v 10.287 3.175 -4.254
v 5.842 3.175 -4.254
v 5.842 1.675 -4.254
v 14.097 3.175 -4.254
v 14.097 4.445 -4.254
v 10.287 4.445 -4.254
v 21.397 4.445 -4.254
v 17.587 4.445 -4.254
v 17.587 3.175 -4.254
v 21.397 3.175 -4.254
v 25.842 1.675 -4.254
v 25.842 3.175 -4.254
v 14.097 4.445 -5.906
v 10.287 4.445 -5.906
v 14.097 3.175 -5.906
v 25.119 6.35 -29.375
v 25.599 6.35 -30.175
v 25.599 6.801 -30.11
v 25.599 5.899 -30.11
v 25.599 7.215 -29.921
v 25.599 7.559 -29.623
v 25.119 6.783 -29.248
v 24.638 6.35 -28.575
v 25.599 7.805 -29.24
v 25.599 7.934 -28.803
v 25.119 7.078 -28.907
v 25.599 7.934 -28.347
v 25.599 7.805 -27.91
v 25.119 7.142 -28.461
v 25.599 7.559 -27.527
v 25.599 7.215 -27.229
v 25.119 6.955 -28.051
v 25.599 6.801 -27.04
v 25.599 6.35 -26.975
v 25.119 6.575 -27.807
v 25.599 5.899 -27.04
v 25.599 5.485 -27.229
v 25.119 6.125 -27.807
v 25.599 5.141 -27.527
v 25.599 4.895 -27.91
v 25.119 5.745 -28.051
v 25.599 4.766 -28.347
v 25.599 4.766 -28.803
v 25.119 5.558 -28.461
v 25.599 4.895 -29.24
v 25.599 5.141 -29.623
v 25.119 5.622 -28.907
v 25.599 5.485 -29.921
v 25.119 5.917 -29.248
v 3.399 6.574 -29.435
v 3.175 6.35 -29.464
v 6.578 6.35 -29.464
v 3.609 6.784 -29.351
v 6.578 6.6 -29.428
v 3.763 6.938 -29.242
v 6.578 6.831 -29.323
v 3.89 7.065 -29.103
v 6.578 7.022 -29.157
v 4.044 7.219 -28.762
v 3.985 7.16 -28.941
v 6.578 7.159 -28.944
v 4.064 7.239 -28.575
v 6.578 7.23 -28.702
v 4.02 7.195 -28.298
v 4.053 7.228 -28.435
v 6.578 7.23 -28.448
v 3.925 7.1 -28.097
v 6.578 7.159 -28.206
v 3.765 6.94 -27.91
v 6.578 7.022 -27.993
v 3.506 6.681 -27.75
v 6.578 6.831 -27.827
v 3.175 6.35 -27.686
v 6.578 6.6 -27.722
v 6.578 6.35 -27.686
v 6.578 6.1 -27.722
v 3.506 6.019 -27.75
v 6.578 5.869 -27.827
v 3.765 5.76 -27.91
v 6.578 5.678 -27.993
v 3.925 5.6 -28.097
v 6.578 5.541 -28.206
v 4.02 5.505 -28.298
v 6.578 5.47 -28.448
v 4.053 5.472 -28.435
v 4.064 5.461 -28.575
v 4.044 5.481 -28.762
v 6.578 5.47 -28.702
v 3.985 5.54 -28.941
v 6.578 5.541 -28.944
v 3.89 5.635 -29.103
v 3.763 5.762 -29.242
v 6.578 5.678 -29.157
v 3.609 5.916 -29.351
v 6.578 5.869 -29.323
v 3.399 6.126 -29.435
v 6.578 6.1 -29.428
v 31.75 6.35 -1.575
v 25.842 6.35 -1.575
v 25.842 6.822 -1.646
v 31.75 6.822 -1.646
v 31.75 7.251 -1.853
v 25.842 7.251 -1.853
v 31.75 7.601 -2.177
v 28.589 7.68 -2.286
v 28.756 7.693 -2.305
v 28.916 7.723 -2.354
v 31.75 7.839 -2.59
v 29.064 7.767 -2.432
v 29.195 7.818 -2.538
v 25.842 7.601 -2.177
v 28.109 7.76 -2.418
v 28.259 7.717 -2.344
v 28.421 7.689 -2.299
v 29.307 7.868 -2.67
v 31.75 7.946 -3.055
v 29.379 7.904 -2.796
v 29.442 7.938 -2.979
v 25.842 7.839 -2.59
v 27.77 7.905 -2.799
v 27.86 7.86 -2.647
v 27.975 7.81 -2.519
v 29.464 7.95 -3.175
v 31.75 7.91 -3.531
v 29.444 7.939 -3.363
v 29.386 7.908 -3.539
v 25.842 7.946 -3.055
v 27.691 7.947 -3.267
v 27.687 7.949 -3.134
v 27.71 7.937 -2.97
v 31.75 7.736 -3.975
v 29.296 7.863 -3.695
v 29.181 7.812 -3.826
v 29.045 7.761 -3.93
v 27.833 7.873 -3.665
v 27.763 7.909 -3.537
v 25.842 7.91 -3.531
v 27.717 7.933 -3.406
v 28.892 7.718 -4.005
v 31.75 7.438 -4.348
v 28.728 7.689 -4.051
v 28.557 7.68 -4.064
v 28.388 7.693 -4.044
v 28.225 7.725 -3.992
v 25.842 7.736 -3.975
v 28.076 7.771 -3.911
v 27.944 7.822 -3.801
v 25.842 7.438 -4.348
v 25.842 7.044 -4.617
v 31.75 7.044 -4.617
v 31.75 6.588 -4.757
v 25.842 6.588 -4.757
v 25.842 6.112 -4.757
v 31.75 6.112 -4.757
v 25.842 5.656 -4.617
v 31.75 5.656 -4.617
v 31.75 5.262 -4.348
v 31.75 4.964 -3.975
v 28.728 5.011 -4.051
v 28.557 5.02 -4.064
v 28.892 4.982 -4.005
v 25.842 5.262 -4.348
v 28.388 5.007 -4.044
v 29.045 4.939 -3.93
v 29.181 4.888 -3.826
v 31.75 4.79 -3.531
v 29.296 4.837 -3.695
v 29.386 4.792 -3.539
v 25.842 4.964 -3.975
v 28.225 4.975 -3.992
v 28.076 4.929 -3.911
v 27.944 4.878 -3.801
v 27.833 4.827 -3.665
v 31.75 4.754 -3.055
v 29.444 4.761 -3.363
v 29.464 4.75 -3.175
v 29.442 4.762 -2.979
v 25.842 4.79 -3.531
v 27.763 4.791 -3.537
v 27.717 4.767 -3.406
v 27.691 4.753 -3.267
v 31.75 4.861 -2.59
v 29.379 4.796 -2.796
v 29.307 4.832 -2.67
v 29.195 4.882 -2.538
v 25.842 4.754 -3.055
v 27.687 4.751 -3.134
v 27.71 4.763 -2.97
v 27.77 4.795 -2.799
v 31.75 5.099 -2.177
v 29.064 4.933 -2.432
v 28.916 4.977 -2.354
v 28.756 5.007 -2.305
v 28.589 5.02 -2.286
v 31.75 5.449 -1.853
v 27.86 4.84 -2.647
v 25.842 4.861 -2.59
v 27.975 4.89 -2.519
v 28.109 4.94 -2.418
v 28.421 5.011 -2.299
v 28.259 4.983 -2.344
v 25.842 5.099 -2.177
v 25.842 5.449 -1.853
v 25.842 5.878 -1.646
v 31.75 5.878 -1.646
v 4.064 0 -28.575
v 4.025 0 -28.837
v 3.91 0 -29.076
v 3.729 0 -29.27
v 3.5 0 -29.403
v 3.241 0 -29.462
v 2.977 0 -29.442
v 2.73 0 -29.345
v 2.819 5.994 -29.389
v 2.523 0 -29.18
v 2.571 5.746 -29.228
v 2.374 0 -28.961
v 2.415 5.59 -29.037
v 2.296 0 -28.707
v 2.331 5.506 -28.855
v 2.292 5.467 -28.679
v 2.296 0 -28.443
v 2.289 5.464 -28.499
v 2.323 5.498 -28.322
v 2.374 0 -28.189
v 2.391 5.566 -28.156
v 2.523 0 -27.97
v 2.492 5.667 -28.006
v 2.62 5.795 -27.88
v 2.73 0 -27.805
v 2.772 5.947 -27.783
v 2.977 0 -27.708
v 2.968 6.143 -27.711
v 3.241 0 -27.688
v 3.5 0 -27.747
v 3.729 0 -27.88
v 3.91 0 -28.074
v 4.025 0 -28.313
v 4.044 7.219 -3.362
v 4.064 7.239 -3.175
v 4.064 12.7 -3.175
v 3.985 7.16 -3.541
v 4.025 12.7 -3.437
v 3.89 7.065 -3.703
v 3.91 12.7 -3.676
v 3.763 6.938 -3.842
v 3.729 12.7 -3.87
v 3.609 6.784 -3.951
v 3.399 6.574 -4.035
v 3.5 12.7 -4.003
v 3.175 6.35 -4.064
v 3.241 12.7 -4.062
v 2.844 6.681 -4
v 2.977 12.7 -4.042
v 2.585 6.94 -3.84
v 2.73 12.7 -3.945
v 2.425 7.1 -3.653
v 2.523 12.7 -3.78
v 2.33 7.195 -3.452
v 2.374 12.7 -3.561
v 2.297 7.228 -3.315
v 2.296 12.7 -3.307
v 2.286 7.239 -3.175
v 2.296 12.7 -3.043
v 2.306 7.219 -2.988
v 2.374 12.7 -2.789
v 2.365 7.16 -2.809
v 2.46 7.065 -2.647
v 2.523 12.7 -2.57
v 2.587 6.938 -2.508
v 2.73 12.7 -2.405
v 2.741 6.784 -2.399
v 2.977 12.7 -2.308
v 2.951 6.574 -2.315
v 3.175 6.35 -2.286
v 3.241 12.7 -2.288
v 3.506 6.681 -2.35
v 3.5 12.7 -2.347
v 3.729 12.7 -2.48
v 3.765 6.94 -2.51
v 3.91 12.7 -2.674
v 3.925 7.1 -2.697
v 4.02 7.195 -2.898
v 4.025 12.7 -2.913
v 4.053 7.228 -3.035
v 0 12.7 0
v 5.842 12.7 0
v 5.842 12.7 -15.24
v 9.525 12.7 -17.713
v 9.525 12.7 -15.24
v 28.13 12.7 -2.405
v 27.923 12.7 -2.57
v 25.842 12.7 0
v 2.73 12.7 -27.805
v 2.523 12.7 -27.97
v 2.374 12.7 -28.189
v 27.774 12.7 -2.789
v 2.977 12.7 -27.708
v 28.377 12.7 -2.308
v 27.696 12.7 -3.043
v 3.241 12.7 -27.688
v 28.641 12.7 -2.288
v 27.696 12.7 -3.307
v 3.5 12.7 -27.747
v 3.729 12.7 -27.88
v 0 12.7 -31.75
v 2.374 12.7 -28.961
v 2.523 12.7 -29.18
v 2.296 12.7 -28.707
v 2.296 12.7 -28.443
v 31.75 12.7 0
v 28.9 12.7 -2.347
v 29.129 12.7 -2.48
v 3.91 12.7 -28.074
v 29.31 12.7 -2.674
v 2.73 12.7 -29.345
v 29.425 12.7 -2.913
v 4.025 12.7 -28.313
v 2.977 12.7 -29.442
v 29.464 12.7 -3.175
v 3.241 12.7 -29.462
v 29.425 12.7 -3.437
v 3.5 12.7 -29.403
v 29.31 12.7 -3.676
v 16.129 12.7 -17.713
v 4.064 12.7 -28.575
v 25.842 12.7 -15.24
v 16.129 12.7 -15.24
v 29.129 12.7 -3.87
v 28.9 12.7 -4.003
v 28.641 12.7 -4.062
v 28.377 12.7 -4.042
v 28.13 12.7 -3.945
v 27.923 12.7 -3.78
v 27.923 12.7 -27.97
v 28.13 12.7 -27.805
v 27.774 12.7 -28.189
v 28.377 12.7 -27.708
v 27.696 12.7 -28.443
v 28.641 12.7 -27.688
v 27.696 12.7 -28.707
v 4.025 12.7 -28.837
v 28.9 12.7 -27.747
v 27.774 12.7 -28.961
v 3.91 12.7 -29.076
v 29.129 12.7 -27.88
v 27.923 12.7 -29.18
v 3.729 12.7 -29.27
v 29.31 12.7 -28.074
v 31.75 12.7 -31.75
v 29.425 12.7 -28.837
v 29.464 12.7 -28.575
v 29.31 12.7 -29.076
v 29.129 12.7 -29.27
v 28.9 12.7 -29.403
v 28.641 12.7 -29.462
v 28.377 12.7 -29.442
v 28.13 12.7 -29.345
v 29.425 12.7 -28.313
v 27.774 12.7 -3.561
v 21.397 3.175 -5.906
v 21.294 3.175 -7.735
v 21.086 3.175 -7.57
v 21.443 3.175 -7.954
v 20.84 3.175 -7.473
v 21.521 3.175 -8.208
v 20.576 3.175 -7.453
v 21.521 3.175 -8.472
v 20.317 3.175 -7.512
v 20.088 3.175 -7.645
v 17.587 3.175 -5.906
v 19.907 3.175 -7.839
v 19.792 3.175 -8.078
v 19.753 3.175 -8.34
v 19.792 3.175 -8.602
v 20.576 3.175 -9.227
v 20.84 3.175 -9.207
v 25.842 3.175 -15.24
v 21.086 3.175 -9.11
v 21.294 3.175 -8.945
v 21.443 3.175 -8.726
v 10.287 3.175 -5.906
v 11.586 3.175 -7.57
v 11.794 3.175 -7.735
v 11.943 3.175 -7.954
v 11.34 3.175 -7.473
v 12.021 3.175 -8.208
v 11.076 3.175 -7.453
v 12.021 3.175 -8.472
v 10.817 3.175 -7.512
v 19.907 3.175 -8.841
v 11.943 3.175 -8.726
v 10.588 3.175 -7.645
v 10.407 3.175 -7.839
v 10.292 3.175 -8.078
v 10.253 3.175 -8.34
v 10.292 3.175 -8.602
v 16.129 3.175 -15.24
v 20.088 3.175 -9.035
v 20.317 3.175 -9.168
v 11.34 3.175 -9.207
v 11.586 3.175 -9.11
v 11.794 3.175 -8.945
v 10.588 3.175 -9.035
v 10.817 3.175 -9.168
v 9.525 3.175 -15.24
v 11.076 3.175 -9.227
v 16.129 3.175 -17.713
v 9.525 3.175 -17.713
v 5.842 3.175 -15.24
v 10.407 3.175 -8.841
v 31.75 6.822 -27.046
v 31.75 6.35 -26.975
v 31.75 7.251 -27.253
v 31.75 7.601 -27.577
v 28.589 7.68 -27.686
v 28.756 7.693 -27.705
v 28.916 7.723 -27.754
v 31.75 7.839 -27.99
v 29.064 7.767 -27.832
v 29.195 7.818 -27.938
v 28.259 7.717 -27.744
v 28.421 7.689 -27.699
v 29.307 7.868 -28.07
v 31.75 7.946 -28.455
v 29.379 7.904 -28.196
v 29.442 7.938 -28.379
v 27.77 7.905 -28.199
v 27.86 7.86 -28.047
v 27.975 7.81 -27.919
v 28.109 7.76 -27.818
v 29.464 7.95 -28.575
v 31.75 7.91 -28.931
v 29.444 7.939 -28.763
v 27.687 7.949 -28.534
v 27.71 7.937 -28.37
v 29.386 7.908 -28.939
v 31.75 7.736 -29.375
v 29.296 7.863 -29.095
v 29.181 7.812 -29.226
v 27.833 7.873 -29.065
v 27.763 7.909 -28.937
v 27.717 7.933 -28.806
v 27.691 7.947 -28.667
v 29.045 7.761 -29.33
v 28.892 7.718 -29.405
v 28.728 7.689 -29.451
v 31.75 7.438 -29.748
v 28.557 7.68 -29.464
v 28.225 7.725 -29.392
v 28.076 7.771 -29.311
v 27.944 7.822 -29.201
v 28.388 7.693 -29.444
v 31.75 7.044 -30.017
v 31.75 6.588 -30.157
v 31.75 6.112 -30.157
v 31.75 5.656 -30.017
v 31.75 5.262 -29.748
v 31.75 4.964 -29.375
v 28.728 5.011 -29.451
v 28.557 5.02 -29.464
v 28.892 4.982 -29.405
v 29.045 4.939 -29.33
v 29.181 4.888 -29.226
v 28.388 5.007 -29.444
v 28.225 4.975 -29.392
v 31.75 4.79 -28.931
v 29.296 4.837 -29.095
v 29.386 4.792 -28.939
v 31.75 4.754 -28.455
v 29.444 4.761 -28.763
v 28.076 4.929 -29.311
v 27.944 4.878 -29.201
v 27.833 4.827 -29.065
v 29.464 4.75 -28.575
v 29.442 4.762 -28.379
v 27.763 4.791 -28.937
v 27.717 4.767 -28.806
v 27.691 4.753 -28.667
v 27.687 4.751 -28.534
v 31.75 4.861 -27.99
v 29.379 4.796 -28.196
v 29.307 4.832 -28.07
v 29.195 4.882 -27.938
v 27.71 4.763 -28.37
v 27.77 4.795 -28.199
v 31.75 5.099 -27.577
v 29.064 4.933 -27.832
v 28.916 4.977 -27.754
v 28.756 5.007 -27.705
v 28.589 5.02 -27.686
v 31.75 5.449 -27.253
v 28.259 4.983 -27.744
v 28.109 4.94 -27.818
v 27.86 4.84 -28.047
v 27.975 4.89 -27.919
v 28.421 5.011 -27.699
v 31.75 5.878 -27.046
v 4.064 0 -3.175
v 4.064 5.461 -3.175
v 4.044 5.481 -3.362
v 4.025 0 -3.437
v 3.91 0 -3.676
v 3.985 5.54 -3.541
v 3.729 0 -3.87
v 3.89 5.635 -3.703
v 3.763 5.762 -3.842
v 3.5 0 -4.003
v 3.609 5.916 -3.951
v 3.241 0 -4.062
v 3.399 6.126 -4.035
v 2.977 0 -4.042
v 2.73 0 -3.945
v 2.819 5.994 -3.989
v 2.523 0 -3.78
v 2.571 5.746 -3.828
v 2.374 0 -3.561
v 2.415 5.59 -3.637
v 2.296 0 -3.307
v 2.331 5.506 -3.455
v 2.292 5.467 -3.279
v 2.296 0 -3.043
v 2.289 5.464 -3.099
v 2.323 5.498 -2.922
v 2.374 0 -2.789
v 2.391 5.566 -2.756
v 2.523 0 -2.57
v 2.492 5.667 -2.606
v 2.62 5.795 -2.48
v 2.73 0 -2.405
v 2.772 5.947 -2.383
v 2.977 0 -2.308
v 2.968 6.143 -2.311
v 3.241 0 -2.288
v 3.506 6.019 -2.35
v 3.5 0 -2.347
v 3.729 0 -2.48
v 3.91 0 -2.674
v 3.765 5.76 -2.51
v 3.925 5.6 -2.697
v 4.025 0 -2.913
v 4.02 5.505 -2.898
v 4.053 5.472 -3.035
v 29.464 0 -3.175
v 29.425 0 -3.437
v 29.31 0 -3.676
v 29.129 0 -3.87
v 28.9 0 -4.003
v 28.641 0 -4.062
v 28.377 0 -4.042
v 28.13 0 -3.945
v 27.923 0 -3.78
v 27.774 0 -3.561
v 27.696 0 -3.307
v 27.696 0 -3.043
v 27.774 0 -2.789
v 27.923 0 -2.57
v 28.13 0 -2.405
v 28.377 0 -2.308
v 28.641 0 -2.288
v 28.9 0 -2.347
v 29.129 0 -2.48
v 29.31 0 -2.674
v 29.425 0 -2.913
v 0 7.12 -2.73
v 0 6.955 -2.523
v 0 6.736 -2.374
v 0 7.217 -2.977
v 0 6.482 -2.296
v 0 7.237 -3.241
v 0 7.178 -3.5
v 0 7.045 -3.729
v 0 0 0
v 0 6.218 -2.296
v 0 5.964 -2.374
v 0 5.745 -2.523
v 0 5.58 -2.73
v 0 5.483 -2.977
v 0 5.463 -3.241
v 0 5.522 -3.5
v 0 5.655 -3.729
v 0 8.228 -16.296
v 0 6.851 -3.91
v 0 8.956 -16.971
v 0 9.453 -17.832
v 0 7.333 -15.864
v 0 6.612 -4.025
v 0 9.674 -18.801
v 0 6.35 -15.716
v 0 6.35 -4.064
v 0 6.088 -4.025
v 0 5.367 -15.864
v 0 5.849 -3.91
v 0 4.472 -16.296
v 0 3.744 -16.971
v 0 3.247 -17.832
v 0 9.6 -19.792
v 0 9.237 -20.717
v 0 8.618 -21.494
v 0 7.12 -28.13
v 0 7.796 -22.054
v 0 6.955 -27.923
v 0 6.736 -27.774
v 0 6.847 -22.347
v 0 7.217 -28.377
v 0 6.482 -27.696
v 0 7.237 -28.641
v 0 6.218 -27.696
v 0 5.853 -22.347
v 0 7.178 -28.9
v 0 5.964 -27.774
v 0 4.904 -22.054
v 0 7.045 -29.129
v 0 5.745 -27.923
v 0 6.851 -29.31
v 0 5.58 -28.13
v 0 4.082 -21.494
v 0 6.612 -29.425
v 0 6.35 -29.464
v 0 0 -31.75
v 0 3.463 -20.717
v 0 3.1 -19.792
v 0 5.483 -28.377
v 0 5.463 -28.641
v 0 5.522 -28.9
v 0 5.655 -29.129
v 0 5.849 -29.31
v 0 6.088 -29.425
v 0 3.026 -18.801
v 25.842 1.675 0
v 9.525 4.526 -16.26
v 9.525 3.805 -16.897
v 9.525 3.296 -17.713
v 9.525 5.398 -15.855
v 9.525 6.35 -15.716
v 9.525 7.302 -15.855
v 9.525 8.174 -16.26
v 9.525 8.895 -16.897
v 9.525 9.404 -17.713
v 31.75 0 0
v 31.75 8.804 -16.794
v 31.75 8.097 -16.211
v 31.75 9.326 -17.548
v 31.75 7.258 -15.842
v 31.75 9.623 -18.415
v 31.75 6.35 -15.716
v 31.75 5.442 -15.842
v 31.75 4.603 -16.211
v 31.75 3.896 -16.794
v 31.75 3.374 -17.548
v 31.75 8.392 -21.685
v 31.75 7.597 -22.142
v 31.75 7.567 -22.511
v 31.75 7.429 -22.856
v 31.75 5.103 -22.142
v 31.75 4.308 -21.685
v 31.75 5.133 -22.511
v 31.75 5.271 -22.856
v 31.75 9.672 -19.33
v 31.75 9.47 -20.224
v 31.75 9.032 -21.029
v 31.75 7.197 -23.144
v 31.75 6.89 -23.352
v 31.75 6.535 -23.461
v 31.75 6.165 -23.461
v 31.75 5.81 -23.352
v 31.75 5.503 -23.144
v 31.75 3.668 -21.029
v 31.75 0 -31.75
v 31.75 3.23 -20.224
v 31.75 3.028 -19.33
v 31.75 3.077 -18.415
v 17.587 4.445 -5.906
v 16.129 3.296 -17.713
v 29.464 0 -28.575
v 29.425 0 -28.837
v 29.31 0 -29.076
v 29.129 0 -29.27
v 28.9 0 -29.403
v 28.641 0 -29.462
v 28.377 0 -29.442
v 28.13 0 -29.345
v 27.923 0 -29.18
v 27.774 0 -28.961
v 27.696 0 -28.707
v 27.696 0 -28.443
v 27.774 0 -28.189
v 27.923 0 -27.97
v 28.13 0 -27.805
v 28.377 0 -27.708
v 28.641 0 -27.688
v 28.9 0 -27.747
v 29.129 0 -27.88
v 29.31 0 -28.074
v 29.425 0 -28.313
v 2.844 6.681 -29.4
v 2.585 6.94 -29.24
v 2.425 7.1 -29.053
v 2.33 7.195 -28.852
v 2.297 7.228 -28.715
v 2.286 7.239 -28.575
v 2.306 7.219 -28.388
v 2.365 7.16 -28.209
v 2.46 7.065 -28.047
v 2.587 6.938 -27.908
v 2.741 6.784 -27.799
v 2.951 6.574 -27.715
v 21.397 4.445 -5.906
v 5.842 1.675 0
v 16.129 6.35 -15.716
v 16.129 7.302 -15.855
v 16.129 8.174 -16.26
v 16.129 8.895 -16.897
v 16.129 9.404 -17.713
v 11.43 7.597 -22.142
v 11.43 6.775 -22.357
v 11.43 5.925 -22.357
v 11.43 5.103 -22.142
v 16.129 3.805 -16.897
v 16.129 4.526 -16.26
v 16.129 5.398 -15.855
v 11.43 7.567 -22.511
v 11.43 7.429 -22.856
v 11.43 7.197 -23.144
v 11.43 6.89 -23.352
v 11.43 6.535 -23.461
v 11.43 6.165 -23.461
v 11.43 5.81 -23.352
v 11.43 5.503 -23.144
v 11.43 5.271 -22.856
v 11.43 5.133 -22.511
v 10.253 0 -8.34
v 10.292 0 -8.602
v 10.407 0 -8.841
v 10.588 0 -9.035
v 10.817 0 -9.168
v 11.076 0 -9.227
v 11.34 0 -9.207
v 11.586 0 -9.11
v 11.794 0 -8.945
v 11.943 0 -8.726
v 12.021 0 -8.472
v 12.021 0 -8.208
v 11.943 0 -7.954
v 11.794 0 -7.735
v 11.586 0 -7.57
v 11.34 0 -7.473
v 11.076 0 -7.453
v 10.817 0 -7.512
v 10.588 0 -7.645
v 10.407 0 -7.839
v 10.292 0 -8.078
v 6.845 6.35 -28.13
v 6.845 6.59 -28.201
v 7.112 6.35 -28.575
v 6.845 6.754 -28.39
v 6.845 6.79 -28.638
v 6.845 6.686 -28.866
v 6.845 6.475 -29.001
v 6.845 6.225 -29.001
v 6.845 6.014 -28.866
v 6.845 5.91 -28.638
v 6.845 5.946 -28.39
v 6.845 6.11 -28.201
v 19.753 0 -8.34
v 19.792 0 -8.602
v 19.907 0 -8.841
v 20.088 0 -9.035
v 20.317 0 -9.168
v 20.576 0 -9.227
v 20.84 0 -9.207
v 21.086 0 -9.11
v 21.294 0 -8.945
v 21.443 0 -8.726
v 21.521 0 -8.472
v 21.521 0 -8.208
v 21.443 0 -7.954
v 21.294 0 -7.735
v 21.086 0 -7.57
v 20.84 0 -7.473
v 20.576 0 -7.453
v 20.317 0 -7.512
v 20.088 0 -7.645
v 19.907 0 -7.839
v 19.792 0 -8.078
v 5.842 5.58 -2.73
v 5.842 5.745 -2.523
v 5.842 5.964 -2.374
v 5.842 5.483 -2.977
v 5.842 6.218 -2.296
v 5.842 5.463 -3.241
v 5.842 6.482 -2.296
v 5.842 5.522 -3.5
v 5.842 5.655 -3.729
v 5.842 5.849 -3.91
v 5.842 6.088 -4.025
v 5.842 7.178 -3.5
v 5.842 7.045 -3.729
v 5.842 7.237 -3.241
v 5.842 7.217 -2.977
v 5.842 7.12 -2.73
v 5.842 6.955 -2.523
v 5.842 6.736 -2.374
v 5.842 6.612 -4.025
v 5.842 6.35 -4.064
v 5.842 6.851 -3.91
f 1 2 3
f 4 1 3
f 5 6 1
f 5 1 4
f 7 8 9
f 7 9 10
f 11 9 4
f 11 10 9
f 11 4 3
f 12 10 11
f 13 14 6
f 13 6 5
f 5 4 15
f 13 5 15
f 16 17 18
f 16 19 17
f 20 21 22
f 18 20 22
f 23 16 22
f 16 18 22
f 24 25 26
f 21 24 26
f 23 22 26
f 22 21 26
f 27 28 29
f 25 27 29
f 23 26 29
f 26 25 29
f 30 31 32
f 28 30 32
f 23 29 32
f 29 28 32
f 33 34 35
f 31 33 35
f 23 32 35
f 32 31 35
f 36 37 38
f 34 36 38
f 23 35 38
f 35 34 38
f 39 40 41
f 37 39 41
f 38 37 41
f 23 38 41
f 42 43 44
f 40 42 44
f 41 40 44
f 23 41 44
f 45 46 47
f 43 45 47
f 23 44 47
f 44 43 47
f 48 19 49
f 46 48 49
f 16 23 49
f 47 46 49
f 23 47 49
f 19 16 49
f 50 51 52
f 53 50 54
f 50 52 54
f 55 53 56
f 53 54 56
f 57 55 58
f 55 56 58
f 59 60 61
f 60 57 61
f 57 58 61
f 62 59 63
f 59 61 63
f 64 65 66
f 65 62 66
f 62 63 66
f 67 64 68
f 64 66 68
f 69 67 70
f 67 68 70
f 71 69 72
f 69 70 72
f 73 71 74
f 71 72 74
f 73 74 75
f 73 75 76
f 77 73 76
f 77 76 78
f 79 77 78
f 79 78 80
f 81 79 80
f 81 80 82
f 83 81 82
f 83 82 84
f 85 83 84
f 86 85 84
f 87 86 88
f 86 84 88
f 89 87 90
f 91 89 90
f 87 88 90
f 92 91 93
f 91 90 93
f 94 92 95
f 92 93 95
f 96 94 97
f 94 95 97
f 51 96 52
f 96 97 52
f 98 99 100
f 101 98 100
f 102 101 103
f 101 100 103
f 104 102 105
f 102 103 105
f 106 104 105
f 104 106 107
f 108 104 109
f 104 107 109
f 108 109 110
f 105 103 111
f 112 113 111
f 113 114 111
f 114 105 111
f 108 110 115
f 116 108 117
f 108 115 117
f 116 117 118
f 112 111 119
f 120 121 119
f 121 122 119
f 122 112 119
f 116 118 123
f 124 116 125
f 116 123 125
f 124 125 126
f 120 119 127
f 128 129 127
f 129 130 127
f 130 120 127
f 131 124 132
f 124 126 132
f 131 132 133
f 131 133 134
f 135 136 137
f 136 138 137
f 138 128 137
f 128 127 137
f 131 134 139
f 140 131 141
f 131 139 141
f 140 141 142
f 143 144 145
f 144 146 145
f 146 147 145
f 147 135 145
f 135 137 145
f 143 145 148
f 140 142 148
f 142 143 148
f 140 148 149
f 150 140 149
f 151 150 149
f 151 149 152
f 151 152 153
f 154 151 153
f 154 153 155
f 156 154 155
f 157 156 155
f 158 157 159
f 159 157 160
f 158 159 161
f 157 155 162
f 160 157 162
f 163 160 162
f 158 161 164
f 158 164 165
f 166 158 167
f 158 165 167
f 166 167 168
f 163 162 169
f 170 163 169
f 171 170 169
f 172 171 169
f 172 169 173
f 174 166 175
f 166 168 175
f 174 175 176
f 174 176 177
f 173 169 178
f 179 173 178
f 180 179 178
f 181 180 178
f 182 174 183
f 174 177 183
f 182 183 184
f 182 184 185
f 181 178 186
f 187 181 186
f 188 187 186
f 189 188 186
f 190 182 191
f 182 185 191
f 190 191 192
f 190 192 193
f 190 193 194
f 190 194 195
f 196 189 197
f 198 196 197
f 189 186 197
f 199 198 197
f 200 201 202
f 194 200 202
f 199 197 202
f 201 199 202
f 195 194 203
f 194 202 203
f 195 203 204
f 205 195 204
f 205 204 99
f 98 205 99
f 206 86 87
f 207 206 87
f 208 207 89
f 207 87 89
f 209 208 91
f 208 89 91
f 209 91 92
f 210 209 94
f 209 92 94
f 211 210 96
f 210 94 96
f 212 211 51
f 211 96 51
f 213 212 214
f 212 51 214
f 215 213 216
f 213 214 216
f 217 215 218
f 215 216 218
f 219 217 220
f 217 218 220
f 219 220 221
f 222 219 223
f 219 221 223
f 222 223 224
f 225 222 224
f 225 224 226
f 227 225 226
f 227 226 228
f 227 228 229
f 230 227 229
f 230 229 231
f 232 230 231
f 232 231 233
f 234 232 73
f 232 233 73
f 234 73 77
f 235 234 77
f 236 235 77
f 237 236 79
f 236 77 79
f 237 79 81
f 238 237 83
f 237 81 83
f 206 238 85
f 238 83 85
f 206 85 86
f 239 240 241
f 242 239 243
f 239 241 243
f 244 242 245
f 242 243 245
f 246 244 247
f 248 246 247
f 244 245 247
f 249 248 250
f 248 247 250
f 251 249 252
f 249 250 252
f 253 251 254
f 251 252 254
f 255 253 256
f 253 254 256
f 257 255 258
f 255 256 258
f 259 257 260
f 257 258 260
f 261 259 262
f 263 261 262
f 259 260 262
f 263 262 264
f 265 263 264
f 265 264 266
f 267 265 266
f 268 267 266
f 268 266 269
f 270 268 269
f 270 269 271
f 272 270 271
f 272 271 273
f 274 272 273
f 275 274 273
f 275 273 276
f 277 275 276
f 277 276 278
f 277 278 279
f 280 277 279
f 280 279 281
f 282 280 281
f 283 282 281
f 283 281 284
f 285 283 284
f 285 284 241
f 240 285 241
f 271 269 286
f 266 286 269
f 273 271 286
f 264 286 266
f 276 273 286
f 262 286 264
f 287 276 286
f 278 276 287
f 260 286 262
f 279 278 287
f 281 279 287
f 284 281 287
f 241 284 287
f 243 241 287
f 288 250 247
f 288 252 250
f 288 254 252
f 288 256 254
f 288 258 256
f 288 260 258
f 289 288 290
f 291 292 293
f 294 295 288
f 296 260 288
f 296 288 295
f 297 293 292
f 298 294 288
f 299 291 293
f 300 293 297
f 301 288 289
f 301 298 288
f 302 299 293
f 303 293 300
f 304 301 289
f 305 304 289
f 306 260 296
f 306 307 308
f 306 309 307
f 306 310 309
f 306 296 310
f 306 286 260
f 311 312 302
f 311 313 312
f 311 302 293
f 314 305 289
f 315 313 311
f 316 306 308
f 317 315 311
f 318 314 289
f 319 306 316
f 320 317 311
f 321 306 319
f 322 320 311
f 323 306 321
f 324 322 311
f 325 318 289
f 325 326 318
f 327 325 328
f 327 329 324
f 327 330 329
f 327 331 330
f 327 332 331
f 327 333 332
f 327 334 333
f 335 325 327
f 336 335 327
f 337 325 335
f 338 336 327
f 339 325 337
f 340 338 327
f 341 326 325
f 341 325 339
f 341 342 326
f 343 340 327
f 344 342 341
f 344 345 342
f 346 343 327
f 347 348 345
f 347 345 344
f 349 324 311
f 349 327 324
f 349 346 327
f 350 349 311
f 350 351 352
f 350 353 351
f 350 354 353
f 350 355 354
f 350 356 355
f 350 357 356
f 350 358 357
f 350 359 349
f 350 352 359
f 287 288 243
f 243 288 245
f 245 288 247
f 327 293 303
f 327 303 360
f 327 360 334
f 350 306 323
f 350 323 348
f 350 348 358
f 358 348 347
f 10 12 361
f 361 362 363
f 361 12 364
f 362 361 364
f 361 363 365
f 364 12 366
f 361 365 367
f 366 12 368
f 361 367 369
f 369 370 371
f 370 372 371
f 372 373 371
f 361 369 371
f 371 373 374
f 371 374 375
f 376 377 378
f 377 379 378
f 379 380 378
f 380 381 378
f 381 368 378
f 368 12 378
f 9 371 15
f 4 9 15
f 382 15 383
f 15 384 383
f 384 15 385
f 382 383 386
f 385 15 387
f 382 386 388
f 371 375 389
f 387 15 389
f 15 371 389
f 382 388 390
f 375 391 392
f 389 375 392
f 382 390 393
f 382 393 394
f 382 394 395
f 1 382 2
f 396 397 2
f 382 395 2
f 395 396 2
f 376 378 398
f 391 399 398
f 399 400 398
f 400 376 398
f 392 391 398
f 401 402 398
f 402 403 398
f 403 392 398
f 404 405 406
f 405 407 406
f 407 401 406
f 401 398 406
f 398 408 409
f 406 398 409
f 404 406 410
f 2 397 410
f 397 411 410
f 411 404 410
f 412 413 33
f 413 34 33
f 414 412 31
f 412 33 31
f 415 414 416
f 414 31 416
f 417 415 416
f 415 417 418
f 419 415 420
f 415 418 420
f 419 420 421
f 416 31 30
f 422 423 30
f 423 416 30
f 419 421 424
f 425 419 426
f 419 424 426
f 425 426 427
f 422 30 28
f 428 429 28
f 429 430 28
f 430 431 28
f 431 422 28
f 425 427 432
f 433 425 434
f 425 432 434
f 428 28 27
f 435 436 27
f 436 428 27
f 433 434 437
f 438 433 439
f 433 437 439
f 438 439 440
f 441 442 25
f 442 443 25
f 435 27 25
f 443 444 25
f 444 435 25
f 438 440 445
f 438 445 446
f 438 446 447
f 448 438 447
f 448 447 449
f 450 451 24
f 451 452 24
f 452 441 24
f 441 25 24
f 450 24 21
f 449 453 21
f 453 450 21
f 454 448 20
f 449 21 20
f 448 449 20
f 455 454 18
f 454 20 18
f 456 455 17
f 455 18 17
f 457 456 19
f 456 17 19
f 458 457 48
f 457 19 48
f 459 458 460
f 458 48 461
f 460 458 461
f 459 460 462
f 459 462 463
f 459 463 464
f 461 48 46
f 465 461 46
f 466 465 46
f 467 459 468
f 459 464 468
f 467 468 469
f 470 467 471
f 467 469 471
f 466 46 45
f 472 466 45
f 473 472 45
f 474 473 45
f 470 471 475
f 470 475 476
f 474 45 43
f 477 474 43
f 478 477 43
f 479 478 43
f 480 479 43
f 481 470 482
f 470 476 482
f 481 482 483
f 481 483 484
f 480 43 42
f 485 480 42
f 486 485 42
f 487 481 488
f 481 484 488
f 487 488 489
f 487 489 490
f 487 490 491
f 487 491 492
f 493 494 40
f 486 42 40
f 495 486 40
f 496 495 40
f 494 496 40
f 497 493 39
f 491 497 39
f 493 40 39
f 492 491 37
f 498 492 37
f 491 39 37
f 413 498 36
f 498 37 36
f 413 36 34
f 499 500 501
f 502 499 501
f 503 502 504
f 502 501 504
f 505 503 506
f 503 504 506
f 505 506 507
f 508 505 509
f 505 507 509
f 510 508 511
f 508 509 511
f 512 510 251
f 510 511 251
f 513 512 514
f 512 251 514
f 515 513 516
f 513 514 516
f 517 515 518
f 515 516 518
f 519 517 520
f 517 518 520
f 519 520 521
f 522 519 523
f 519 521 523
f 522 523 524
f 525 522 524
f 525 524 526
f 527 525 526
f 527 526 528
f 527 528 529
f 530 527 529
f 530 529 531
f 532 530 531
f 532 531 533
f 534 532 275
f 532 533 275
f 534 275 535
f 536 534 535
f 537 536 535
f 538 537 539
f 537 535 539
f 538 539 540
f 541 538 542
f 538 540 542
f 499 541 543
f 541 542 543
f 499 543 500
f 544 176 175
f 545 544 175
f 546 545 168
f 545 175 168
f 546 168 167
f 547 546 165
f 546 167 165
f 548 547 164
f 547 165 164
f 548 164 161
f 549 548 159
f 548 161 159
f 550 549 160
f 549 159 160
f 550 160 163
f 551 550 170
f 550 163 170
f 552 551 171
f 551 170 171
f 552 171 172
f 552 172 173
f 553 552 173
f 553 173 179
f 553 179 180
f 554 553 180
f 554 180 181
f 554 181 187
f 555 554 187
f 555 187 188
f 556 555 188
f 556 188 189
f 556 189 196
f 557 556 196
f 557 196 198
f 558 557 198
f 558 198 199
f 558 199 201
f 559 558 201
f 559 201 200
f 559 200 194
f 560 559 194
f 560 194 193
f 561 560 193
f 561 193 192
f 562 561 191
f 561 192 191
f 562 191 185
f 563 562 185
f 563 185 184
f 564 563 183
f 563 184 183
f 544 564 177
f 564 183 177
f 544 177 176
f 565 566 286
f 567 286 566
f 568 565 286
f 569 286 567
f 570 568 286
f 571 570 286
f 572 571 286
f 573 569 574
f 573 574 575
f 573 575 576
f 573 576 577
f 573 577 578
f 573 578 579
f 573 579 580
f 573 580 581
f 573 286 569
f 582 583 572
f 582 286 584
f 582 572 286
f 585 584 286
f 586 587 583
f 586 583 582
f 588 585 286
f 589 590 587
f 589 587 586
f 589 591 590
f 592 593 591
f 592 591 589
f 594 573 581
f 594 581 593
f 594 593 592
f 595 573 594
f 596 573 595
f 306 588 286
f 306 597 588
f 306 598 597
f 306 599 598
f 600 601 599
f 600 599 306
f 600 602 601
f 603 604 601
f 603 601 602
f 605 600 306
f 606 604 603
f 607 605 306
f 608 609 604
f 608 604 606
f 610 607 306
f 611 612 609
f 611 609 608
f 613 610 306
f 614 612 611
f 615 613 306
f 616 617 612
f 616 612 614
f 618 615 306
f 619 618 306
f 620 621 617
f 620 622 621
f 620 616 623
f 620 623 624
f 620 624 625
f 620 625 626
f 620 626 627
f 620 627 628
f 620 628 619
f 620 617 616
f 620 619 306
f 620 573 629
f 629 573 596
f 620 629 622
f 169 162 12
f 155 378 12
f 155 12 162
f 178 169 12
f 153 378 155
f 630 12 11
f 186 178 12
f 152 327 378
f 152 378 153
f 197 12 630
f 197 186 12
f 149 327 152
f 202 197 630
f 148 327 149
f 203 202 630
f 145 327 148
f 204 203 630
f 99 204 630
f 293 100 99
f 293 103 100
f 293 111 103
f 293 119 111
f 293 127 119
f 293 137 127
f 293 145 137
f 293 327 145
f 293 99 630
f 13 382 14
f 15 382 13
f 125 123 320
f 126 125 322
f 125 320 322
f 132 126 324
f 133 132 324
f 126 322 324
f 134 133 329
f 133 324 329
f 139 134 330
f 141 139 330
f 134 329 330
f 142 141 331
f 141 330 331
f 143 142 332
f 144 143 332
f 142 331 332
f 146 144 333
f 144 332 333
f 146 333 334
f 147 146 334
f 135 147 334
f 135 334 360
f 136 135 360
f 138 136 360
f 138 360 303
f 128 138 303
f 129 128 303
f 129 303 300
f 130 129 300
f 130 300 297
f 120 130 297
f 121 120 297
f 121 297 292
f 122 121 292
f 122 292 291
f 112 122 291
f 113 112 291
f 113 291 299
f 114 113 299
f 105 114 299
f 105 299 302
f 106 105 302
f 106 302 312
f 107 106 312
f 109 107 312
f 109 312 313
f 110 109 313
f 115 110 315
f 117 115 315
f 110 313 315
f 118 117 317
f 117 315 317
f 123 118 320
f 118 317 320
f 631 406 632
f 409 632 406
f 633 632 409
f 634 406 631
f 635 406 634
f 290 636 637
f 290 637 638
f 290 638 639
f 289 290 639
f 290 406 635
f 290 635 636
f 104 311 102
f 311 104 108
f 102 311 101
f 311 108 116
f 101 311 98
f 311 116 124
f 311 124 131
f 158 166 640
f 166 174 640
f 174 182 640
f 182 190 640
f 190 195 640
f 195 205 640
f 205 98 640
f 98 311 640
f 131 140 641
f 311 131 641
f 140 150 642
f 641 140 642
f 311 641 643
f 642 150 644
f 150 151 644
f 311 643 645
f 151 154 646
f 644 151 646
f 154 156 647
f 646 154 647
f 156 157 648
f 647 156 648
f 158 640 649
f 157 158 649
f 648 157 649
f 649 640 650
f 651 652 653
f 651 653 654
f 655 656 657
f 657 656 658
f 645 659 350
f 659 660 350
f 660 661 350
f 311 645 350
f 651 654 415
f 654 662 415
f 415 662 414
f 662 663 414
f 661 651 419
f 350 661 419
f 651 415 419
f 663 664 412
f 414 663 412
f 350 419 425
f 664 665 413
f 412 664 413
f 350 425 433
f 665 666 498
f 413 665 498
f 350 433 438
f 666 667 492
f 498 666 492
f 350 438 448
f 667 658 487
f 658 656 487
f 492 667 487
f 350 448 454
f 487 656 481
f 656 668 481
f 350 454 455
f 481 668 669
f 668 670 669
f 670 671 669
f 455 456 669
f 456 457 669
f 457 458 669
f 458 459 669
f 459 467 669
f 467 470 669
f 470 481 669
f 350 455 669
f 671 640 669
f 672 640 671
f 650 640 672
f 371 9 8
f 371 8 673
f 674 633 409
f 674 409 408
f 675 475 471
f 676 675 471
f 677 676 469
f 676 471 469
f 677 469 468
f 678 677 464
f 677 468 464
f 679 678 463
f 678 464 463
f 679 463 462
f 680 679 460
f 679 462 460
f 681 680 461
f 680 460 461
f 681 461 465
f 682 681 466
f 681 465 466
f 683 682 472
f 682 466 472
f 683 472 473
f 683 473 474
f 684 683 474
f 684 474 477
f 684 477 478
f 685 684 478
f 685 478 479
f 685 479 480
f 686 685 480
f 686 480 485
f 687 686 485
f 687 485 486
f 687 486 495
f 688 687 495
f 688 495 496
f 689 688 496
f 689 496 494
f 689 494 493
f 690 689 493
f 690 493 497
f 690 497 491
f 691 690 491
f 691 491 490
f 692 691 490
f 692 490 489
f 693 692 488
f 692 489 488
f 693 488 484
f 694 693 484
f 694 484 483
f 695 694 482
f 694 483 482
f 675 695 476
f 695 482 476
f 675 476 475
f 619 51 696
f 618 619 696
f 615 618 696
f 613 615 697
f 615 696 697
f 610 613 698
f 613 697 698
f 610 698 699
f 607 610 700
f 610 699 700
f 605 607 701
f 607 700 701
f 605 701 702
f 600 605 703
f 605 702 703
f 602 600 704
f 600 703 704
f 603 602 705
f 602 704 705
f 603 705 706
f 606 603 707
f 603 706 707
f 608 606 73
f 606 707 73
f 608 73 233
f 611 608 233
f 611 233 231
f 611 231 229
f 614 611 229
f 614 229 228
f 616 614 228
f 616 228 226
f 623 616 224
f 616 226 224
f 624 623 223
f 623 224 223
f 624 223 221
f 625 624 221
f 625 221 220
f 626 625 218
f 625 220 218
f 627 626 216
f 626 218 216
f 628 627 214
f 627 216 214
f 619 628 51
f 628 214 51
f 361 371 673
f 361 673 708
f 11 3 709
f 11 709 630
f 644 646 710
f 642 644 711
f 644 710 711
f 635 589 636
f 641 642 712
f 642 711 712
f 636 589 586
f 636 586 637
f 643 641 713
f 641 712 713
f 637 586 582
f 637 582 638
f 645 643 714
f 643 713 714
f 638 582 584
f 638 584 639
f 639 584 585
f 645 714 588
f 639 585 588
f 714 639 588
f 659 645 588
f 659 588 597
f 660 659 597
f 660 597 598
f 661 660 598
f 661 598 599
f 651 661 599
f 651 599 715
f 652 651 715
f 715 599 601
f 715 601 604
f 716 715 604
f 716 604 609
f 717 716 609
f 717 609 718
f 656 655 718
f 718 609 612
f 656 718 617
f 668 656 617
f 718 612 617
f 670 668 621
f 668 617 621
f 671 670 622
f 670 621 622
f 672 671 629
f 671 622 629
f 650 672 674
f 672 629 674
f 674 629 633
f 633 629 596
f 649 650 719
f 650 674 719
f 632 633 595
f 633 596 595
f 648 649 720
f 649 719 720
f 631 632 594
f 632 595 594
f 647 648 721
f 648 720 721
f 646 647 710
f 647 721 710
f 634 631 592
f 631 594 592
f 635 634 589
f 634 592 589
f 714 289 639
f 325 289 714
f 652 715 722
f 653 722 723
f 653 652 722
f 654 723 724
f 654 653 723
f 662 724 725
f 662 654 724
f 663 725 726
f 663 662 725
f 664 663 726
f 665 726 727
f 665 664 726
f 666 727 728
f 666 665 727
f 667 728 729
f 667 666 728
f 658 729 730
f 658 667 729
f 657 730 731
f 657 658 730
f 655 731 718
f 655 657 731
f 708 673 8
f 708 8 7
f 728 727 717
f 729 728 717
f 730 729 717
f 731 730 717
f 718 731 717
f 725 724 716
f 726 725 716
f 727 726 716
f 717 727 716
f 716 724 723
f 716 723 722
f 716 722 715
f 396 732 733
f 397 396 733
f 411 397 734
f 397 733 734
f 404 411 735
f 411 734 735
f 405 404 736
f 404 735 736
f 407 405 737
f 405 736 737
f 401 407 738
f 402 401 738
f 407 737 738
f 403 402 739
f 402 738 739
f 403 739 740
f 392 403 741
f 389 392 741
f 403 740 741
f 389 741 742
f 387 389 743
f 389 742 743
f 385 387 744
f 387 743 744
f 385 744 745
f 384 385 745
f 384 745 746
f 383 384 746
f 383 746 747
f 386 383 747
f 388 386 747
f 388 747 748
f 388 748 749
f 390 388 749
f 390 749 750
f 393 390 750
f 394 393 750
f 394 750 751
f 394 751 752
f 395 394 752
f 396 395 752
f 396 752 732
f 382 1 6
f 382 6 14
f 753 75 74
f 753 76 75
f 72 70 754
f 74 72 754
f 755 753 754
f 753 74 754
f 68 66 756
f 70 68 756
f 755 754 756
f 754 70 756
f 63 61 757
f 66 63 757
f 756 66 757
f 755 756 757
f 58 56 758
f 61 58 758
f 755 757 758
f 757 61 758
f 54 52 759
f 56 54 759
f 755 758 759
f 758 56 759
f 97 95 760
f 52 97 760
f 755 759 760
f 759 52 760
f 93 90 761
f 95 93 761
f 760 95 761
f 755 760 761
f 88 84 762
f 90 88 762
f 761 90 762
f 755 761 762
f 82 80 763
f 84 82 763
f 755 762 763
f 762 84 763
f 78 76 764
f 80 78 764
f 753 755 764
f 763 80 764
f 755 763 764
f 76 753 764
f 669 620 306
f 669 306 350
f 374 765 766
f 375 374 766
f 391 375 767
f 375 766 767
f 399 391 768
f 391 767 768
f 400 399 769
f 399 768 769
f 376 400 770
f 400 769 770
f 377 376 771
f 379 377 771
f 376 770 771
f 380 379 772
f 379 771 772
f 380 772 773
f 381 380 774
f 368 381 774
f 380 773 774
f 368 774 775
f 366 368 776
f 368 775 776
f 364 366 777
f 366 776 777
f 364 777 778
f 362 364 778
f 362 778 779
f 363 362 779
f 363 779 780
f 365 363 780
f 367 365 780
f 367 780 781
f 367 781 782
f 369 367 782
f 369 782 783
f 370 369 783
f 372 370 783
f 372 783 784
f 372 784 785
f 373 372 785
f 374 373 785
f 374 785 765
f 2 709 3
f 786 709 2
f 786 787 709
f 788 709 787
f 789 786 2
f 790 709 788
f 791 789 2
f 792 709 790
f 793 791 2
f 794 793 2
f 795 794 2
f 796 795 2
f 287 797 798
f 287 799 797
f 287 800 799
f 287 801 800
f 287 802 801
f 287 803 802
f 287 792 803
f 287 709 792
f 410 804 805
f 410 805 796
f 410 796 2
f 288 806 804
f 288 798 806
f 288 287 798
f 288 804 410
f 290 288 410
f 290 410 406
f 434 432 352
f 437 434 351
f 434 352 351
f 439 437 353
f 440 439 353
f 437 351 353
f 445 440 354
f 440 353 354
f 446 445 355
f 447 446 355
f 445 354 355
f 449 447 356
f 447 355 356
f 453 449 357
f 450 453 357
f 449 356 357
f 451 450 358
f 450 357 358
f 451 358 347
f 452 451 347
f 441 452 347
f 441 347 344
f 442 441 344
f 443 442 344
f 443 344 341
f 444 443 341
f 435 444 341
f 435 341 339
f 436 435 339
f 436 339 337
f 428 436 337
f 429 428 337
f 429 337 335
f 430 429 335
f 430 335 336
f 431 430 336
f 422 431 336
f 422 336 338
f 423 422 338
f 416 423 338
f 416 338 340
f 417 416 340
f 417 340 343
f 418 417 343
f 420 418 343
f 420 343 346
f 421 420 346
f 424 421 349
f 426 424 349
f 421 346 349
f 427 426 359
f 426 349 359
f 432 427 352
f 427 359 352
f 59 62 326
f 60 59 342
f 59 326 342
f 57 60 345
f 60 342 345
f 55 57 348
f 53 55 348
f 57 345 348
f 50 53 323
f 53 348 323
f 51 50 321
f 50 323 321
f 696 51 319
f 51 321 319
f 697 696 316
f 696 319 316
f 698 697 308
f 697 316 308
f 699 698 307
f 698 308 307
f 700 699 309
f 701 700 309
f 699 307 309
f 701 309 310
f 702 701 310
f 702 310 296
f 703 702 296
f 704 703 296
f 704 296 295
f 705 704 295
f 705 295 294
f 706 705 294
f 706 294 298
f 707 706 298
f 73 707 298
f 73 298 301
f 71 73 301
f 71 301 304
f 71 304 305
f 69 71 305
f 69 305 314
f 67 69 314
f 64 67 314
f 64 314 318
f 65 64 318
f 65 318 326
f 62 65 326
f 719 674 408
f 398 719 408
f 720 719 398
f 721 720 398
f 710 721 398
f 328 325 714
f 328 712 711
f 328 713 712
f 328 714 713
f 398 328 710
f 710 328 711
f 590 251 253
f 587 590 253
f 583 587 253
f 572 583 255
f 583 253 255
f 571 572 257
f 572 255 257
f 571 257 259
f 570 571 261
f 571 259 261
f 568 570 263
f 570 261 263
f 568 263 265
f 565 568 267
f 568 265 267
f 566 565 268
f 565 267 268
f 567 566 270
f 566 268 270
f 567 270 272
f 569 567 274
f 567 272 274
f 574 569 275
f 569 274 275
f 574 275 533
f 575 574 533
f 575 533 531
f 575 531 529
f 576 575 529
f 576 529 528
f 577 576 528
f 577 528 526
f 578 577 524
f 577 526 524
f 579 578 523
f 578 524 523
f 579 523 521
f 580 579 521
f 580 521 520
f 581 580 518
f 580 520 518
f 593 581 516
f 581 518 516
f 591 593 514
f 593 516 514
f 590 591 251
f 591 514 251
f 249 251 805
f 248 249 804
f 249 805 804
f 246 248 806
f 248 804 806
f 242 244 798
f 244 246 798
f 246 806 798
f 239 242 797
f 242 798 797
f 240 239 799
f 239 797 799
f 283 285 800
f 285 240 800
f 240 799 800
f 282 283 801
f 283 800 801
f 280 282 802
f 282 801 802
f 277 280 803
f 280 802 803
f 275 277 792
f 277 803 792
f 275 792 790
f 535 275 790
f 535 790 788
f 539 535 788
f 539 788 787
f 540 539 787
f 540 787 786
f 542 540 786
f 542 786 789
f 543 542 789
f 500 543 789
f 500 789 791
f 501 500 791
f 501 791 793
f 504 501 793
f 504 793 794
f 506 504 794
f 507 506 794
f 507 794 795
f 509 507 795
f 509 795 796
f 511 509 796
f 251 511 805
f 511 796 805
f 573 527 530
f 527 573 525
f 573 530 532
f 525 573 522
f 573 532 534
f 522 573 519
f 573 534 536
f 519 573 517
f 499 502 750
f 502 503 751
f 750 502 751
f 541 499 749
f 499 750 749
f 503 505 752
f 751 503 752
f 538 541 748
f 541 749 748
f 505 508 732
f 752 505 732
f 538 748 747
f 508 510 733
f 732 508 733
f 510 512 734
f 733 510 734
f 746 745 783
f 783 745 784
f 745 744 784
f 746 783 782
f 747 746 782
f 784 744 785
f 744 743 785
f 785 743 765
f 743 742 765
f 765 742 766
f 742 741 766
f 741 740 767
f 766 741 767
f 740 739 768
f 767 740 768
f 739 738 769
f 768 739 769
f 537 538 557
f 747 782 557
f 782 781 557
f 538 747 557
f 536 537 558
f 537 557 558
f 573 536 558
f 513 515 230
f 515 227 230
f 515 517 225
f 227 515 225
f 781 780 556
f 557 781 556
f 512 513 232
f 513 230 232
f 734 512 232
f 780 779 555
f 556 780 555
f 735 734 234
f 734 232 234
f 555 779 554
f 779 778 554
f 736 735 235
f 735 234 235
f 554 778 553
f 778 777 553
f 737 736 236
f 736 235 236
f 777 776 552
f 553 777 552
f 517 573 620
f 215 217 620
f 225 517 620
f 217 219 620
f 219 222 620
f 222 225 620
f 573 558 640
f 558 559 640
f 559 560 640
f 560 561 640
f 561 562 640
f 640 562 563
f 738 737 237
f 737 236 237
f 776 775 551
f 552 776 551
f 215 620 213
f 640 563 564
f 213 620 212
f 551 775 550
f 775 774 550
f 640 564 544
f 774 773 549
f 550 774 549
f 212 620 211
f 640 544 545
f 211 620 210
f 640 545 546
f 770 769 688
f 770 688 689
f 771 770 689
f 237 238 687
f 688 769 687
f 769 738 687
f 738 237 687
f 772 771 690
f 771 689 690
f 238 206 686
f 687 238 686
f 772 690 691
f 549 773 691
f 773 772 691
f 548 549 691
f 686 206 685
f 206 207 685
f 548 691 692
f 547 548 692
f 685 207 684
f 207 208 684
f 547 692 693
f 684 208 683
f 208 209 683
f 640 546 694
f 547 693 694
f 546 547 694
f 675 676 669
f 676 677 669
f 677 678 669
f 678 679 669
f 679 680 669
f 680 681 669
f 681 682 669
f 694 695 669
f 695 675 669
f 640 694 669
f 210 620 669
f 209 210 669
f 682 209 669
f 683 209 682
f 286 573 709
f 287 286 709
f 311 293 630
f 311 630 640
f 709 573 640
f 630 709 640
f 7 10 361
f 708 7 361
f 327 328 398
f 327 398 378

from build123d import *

# Parameters (mm, degrees)
SKETCH1_W                      = 31.75
SKETCH1_H                      = 31.75
MAIN_BODY_DEPTH                = 12.7
CUT_EXTRUDE1_DEPTH             = 9.525
SKETCH3_W                      = 20
SKETCH3_H                      = 4.2545
CUT_EXTRUDE2_DEPTH             = 1.5
SKETCH4_W                      = 3.81
SKETCH4_H                      = 1.651
BOSS_EXTRUDE2_DEPTH            = 1.27
SKETCH5_R                      = 3.33375
CUT_EXTRUDE3_DEPTH             = 32.75
SKETCH6_R                      = 1.25000004
CUT_EXTRUDE4_DEPTH             = 20.32
TAP_DRILL_FOR_2_56_TAP1_D      = 1.778
TAP_DRILL_FOR_2_56_TAP2_D      = 1.778
F_3_2_3_2_DIAMETER_HOLE1_D     = 3.2
F_3_2_3_2_DIAMETER_HOLE1_DEPTH = 6.15062301
F_3_2_3_2_DIAMETER_HOLE1_TIP   = 0.96137699
TAP_DRILL_FOR_2_56_TAP4_D      = 1.778
TAP_DRILL_FOR_2_56_TAP4_DEPTH  = 6.57783491
TAP_DRILL_FOR_2_56_TAP4_TIP    = 0.53416509


with BuildPart() as part:
    # Sketch1 → Main body (new body)
    with BuildSketch(Plane(origin=(0, 0, 0), x_dir=(1, 0, 0), z_dir=(0, 1, 0))):
        with Locations((15.875, 15.875)):
            Rectangle(SKETCH1_W, SKETCH1_H)
    extrude(amount=MAIN_BODY_DEPTH)

    # Sketch2 → Cut-Extrude1 (cut)
    with BuildSketch(Plane(origin=(0, 12.7, 0), x_dir=(1, 0, 0), z_dir=(0, 1, 0))):
        Polygon((5.842, 0), (5.842, 15.24), (9.525, 15.24), (9.525, 17.712672935), (16.129, 17.712672935), (16.129, 15.24), (25.842, 15.24), (25.842, 0), align=None)
    extrude(amount=-CUT_EXTRUDE1_DEPTH, mode=Mode.SUBTRACT)

    # Sketch3 → Cut-Extrude2 (cut)
    with BuildSketch(Plane(origin=(0, 3.175, 0), x_dir=(1, 0, 0), z_dir=(0, 1, 0))):
        with Locations((15.842, 2.12725)):
            Rectangle(SKETCH3_W, SKETCH3_H)
    extrude(amount=-CUT_EXTRUDE2_DEPTH, mode=Mode.SUBTRACT)

    # Sketch4 → Boss-Extrude2 (add)
    with BuildSketch(Plane(origin=(0, 3.175, 0), x_dir=(1, 0, 0), z_dir=(0, 1, 0))):
        with Locations((12.192, 5.08)):
            Rectangle(SKETCH4_W, SKETCH4_H)
        with Locations((19.492, 5.08)):
            Rectangle(SKETCH4_W, SKETCH4_H)
    extrude(amount=BOSS_EXTRUDE2_DEPTH)

    # Sketch5 → Cut-Extrude3 (cut, through all)
    with BuildSketch(Plane.ZY):
        with Locations((-19.05, 6.35)):
            Circle(SKETCH5_R)
    extrude(amount=-CUT_EXTRUDE3_DEPTH, mode=Mode.SUBTRACT)

    # Sketch6 → Cut-Extrude4 (cut)
    with BuildSketch(Plane.ZY.offset(-31.75)):
        with Locations((-22.225, 6.35)):
            Circle(SKETCH6_R)
    extrude(amount=CUT_EXTRUDE4_DEPTH, mode=Mode.SUBTRACT)

    # Tap Drill for #2-56 Tap1 (through all)
    with Locations(Plane(origin=(0, 0, 0), x_dir=(-1, 0, 0), z_dir=(0, -1, 0))):
        with Locations((-28.575, 3.175), (-28.575, 28.575), (-3.175, 3.175), (-3.175, 28.575)):
            Hole(TAP_DRILL_FOR_2_56_TAP1_D / 2)

    # Tap Drill for #2-56 Tap2 (through all)
    with Locations(Plane(origin=(0, 3.175, 0), x_dir=(1, 0, 0), z_dir=(0, 1, 0))):
        with Locations((20.642, 8.34), (11.142, 8.34)):
            Hole(TAP_DRILL_FOR_2_56_TAP2_D / 2)

    # Ø3.2 (3.2) Diameter Hole1
    with Locations(Plane(origin=(31.75, 0, 0), x_dir=(0, 0, -1), z_dir=(1, 0, 0))):
        with Locations((28.575, 6.35), (3.175, 6.35)):
            Hole(F_3_2_3_2_DIAMETER_HOLE1_D / 2, depth=F_3_2_3_2_DIAMETER_HOLE1_DEPTH)
            with Locations((0, 0, -(F_3_2_3_2_DIAMETER_HOLE1_DEPTH + F_3_2_3_2_DIAMETER_HOLE1_TIP / 2))):  # 118° drill point
                Cone(0, F_3_2_3_2_DIAMETER_HOLE1_D / 2, F_3_2_3_2_DIAMETER_HOLE1_TIP, mode=Mode.SUBTRACT)

    # Tap Drill for #2-56 Tap4
    with Locations(Plane.ZY):
        with Locations((-3.175, 6.35), (-28.575, 6.35)):
            Hole(TAP_DRILL_FOR_2_56_TAP4_D / 2, depth=TAP_DRILL_FOR_2_56_TAP4_DEPTH)
            with Locations((0, 0, -(TAP_DRILL_FOR_2_56_TAP4_DEPTH + TAP_DRILL_FOR_2_56_TAP4_TIP / 2))):  # 118° drill point
                Cone(0, TAP_DRILL_FOR_2_56_TAP4_D / 2, TAP_DRILL_FOR_2_56_TAP4_TIP, mode=Mode.SUBTRACT)


solid = part.part
